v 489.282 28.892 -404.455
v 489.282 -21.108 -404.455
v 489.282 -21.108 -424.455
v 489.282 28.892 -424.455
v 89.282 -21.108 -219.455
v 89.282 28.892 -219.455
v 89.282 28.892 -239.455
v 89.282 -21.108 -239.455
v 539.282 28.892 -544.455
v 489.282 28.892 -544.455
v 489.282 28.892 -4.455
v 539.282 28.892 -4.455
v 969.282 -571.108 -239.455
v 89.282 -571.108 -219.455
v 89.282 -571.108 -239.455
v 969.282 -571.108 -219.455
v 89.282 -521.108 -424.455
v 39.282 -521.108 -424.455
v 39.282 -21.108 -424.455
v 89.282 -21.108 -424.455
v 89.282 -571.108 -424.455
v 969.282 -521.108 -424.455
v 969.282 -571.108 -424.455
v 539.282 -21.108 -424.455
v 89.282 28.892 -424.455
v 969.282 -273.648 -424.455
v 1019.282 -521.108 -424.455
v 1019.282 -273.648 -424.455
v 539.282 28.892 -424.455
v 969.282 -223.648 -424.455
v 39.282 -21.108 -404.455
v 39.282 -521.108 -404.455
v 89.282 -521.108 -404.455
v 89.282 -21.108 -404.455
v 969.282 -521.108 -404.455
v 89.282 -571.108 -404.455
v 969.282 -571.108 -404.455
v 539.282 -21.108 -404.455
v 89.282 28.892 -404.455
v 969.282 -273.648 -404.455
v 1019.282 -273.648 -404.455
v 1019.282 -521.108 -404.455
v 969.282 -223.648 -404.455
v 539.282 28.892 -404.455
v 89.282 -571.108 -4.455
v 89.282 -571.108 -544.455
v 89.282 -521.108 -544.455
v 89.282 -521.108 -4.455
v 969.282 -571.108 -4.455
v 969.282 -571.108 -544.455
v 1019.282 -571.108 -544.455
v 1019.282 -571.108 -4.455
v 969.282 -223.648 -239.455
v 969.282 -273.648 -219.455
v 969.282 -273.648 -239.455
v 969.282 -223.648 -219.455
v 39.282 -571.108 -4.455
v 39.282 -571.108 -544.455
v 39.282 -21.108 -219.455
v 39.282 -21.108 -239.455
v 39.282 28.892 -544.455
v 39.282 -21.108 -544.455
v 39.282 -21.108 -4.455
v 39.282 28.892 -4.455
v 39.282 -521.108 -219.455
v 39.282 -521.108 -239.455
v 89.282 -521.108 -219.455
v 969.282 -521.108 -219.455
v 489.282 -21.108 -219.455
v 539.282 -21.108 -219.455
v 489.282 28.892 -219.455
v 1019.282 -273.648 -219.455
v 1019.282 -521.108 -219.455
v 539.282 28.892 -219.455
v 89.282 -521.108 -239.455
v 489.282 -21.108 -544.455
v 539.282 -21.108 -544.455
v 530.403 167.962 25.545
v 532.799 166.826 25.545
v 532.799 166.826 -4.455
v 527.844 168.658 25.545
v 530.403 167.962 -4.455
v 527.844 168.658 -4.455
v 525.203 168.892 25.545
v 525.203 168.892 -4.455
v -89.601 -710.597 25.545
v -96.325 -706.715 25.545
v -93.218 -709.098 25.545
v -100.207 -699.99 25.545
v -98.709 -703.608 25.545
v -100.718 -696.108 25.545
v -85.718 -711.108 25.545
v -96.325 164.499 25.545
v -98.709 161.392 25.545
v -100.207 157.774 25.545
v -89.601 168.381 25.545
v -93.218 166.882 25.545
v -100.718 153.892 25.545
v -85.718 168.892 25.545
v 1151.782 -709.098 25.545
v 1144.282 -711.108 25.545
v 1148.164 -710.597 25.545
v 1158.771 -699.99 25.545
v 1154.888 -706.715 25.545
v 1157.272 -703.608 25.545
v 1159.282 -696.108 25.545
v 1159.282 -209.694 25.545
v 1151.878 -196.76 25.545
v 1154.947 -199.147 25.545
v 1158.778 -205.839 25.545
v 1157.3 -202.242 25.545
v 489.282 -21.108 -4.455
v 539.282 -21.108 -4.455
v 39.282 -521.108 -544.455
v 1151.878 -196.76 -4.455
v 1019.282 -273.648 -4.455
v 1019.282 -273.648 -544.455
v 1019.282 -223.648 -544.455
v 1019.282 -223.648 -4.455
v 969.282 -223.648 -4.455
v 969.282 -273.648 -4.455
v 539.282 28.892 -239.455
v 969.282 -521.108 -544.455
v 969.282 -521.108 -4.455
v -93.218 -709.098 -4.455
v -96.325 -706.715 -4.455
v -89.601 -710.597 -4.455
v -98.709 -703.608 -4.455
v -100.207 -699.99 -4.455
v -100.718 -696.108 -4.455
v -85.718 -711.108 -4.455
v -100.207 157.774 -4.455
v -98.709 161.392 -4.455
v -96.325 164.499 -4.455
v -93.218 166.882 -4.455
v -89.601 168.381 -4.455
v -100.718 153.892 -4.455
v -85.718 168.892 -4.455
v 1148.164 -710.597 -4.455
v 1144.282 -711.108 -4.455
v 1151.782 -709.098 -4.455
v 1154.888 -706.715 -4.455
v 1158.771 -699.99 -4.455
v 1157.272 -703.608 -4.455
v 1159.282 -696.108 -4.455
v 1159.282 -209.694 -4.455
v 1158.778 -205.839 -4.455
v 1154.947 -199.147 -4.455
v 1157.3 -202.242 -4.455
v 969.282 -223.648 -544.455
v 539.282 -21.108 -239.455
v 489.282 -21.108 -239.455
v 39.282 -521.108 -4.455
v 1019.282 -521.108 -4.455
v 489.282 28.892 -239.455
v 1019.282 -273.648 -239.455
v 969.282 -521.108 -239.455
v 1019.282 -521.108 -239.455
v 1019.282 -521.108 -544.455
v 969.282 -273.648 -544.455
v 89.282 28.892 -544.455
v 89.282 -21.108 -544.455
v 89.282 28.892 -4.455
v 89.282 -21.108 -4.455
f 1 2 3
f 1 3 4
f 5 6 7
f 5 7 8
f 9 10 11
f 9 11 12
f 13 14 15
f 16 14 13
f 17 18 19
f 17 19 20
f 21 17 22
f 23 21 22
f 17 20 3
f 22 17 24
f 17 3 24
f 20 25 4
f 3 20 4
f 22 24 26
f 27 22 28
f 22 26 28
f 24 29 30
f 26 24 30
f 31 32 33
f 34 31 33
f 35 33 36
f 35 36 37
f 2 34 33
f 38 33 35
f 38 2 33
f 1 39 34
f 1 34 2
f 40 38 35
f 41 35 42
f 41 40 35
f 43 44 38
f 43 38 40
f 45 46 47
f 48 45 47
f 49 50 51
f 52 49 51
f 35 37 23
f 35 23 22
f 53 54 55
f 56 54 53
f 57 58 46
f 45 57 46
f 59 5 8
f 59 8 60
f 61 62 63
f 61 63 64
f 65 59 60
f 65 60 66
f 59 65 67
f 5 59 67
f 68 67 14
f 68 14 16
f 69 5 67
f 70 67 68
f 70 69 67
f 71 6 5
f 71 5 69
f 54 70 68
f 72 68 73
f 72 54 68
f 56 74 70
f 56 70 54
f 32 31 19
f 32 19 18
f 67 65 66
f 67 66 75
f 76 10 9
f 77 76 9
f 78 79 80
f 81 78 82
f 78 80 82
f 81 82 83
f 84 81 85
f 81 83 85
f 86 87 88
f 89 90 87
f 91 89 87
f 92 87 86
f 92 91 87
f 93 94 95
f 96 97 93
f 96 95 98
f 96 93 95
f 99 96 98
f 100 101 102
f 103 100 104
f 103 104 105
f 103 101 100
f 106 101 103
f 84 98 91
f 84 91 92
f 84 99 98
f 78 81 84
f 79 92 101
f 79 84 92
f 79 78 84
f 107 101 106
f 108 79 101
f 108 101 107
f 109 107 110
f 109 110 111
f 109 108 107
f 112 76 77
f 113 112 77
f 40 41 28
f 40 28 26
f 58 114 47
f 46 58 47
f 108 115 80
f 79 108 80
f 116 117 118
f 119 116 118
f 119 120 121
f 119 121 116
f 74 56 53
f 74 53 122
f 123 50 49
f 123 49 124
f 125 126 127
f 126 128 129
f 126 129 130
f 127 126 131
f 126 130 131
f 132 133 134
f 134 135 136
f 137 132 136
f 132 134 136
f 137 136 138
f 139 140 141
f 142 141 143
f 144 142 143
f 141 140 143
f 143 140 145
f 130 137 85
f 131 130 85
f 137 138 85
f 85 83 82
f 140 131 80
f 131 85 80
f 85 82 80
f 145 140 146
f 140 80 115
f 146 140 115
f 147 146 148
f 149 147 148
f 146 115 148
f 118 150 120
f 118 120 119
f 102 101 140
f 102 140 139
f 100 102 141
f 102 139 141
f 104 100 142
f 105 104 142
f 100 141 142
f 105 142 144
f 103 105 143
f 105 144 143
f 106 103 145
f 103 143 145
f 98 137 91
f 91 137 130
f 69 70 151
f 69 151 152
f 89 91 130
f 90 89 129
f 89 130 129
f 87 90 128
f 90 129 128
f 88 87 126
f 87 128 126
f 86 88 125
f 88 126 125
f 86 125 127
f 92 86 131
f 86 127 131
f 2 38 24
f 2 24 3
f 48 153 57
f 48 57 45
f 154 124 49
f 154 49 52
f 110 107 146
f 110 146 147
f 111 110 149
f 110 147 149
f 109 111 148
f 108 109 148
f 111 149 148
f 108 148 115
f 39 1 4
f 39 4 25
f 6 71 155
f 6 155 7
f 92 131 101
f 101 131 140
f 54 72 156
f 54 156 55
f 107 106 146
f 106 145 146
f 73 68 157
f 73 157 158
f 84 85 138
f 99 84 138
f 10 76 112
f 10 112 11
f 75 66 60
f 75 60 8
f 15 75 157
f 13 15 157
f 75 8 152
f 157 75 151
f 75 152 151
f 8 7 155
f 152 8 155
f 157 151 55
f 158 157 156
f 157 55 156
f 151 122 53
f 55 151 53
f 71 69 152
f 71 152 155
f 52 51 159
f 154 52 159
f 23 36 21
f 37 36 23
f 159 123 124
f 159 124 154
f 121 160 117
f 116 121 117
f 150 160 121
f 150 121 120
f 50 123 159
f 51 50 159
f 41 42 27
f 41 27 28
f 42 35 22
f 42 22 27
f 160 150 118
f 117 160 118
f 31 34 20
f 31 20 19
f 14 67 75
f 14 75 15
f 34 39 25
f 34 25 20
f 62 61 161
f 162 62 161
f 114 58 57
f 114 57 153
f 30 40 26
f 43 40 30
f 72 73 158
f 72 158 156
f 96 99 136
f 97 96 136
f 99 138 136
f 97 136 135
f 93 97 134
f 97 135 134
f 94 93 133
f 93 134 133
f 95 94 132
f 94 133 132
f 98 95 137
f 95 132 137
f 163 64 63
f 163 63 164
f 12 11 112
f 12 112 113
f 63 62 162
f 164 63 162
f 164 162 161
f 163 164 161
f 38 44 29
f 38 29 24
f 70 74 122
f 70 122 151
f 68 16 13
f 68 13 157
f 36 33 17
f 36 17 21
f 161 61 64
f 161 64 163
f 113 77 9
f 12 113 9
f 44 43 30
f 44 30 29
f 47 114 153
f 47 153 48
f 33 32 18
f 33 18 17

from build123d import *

# Parameters (mm, degrees)
F2_START      = -4.4552753679
F0_W          = 50
F0_H          = 50
F2_DEPTH      = 540
F3_DEPTH      = 4.4552753679
F3_DEPTH_BACK = 25.5447246321
F4_START      = -404.4552753679
F4_DEPTH      = 20
F5_START      = -219.4552753679
F5_DEPTH      = 20


with BuildPart() as f2:
    # F0 (on Top) → F2 (new body)
    with BuildSketch(Plane.XY.offset(F2_START)):
        with Locations((64.2817475274, -546.1079187691)):
            Rectangle(F0_W, F0_H)
    extrude(amount=-F2_DEPTH)


with BuildPart() as f2b:
    # F0 (on Top) → F2, piece 2 (new body)
    with BuildSketch(Plane.XY.offset(F2_START)):
        with Locations((994.2817475274, -546.1079187691)):
            Rectangle(F0_W, F0_H)
    extrude(amount=-F2_DEPTH)


with BuildPart() as f2c:
    # F0 (on Top) → F2, piece 3 (new body)
    with BuildSketch(Plane.XY.offset(F2_START)):
        with Locations((994.2817475274, -248.6476013088)):
            Rectangle(F0_W, F0_H)
    extrude(amount=-F2_DEPTH)


with BuildPart() as f2d:
    # F0 (on Top) → F2, piece 4 (new body)
    with BuildSketch(Plane.XY.offset(F2_START)):
        with Locations((514.2817475274, 3.8920812309)):
            Rectangle(F0_W, F0_H)
    extrude(amount=-F2_DEPTH)


with BuildPart() as f2e:
    # F0 (on Top) → F2, piece 5 (new body)
    with BuildSketch(Plane.XY.offset(F2_START)):
        with Locations((64.2817475274, 3.8920812309)):
            Rectangle(F0_W, F0_H)
    extrude(amount=-F2_DEPTH)


with BuildPart() as f3:
    # F0 (on Top) → F3 (new body, two sides)
    with BuildSketch(Plane.XY) as f3_sk:
        with BuildLine():
            Line((525.2027132718, 168.8920812309), (-85.7182524726, 168.8920812309))
            ThreePointArc((-85.7182524726, 168.8920812309), (-96.3248541904, 164.4986829487), (-100.7182524726, 153.8920812309))
            Line((-100.7182524726, 153.8920812309), (-100.7182524726, -696.1079187691))
            ThreePointArc((-100.7182524726, -696.1079187691), (-96.3248541904, -706.7145204869), (-85.7182524726, -711.1079187691))
            Line((-85.7182524726, -711.1079187691), (1144.2817475274, -711.1079187691))
            ThreePointArc((1144.2817475274, -711.1079187691), (1154.8883492452, -706.7145204869), (1159.2817475274, -696.1079187691))
            Line((1159.2817475274, -696.1079187691), (1159.2817475274, -209.6940182526))
            ThreePointArc((1159.2817475274, -209.6940182526), (1157.2999063312, -202.2423378139), (1151.8780753461, -196.7597303451))
            Line((1151.8780753461, -196.7597303451), (532.7990410905, 166.8263691383))
            ThreePointArc((532.7990410905, 166.8263691383), (529.1388078711, 168.366443369), (525.2027132718, 168.8920812309))
        make_face()
        Polygon((39.2817475274, -21.1079187691), (39.2817475274, 28.8920812309), (89.2817475274, 28.8920812309), (489.2817475274, 28.8920812309), (539.2817475274, 28.8920812309), (969.2817475274, -223.6476013088), (1019.2817475274, -223.6476013088), (1019.2817475274, -273.6476013088), (1019.2817475274, -521.1079187691), (1019.2817475274, -571.1079187691), (969.2817475274, -571.1079187691), (89.2817475274, -571.1079187691), (39.2817475274, -571.1079187691), (39.2817475274, -521.1079187691), align=None, mode=Mode.SUBTRACT)
        Polygon((489.2817475274, 28.8920812309), (89.2817475274, 28.8920812309), (89.2817475274, -21.1079187691), (39.2817475274, -21.1079187691), (39.2817475274, -521.1079187691), (89.2817475274, -521.1079187691), (89.2817475274, -571.1079187691), (969.2817475274, -571.1079187691), (969.2817475274, -521.1079187691), (1019.2817475274, -521.1079187691), (1019.2817475274, -273.6476013088), (969.2817475274, -273.6476013088), (969.2817475274, -223.6476013088), (539.2817475274, 28.8920812309), (539.2817475274, -21.1079187691), (489.2817475274, -21.1079187691), align=None)
        with Locations((64.2817475274, -546.1079187691)):
            Rectangle(F0_W, F0_H)
        with Locations((994.2817475274, -546.1079187691)):
            Rectangle(F0_W, F0_H)
        with Locations((994.2817475274, -248.6476013088)):
            Rectangle(F0_W, F0_H)
        with Locations((514.2817475274, 3.8920812309)):
            Rectangle(F0_W, F0_H)
        with Locations((64.2817475274, 3.8920812309)):
            Rectangle(F0_W, F0_H)
    extrude(amount=-F3_DEPTH)
    extrude(f3_sk.sketch, amount=F3_DEPTH_BACK)


with BuildPart() as f4:
    # F0 (on Top) → F4 (new body)
    with BuildSketch(Plane.XY.offset(F4_START)):
        Polygon((489.2817475274, 28.8920812309), (89.2817475274, 28.8920812309), (89.2817475274, -21.1079187691), (39.2817475274, -21.1079187691), (39.2817475274, -521.1079187691), (89.2817475274, -521.1079187691), (89.2817475274, -571.1079187691), (969.2817475274, -571.1079187691), (969.2817475274, -521.1079187691), (1019.2817475274, -521.1079187691), (1019.2817475274, -273.6476013088), (969.2817475274, -273.6476013088), (969.2817475274, -223.6476013088), (539.2817475274, 28.8920812309), (539.2817475274, -21.1079187691), (489.2817475274, -21.1079187691), align=None)
    extrude(amount=-F4_DEPTH)


with BuildPart() as f5:
    # F0 (on Top) → F5 (new body)
    with BuildSketch(Plane.XY.offset(F5_START)):
        Polygon((489.2817475274, 28.8920812309), (89.2817475274, 28.8920812309), (89.2817475274, -21.1079187691), (39.2817475274, -21.1079187691), (39.2817475274, -521.1079187691), (89.2817475274, -521.1079187691), (89.2817475274, -571.1079187691), (969.2817475274, -571.1079187691), (969.2817475274, -521.1079187691), (1019.2817475274, -521.1079187691), (1019.2817475274, -273.6476013088), (969.2817475274, -273.6476013088), (969.2817475274, -223.6476013088), (539.2817475274, 28.8920812309), (539.2817475274, -21.1079187691), (489.2817475274, -21.1079187691), align=None)
    extrude(amount=-F5_DEPTH)


solid = Compound([f2.part, f2b.part, f2c.part, f2d.part, f2e.part, f3.part, f4.part, f5.part])
